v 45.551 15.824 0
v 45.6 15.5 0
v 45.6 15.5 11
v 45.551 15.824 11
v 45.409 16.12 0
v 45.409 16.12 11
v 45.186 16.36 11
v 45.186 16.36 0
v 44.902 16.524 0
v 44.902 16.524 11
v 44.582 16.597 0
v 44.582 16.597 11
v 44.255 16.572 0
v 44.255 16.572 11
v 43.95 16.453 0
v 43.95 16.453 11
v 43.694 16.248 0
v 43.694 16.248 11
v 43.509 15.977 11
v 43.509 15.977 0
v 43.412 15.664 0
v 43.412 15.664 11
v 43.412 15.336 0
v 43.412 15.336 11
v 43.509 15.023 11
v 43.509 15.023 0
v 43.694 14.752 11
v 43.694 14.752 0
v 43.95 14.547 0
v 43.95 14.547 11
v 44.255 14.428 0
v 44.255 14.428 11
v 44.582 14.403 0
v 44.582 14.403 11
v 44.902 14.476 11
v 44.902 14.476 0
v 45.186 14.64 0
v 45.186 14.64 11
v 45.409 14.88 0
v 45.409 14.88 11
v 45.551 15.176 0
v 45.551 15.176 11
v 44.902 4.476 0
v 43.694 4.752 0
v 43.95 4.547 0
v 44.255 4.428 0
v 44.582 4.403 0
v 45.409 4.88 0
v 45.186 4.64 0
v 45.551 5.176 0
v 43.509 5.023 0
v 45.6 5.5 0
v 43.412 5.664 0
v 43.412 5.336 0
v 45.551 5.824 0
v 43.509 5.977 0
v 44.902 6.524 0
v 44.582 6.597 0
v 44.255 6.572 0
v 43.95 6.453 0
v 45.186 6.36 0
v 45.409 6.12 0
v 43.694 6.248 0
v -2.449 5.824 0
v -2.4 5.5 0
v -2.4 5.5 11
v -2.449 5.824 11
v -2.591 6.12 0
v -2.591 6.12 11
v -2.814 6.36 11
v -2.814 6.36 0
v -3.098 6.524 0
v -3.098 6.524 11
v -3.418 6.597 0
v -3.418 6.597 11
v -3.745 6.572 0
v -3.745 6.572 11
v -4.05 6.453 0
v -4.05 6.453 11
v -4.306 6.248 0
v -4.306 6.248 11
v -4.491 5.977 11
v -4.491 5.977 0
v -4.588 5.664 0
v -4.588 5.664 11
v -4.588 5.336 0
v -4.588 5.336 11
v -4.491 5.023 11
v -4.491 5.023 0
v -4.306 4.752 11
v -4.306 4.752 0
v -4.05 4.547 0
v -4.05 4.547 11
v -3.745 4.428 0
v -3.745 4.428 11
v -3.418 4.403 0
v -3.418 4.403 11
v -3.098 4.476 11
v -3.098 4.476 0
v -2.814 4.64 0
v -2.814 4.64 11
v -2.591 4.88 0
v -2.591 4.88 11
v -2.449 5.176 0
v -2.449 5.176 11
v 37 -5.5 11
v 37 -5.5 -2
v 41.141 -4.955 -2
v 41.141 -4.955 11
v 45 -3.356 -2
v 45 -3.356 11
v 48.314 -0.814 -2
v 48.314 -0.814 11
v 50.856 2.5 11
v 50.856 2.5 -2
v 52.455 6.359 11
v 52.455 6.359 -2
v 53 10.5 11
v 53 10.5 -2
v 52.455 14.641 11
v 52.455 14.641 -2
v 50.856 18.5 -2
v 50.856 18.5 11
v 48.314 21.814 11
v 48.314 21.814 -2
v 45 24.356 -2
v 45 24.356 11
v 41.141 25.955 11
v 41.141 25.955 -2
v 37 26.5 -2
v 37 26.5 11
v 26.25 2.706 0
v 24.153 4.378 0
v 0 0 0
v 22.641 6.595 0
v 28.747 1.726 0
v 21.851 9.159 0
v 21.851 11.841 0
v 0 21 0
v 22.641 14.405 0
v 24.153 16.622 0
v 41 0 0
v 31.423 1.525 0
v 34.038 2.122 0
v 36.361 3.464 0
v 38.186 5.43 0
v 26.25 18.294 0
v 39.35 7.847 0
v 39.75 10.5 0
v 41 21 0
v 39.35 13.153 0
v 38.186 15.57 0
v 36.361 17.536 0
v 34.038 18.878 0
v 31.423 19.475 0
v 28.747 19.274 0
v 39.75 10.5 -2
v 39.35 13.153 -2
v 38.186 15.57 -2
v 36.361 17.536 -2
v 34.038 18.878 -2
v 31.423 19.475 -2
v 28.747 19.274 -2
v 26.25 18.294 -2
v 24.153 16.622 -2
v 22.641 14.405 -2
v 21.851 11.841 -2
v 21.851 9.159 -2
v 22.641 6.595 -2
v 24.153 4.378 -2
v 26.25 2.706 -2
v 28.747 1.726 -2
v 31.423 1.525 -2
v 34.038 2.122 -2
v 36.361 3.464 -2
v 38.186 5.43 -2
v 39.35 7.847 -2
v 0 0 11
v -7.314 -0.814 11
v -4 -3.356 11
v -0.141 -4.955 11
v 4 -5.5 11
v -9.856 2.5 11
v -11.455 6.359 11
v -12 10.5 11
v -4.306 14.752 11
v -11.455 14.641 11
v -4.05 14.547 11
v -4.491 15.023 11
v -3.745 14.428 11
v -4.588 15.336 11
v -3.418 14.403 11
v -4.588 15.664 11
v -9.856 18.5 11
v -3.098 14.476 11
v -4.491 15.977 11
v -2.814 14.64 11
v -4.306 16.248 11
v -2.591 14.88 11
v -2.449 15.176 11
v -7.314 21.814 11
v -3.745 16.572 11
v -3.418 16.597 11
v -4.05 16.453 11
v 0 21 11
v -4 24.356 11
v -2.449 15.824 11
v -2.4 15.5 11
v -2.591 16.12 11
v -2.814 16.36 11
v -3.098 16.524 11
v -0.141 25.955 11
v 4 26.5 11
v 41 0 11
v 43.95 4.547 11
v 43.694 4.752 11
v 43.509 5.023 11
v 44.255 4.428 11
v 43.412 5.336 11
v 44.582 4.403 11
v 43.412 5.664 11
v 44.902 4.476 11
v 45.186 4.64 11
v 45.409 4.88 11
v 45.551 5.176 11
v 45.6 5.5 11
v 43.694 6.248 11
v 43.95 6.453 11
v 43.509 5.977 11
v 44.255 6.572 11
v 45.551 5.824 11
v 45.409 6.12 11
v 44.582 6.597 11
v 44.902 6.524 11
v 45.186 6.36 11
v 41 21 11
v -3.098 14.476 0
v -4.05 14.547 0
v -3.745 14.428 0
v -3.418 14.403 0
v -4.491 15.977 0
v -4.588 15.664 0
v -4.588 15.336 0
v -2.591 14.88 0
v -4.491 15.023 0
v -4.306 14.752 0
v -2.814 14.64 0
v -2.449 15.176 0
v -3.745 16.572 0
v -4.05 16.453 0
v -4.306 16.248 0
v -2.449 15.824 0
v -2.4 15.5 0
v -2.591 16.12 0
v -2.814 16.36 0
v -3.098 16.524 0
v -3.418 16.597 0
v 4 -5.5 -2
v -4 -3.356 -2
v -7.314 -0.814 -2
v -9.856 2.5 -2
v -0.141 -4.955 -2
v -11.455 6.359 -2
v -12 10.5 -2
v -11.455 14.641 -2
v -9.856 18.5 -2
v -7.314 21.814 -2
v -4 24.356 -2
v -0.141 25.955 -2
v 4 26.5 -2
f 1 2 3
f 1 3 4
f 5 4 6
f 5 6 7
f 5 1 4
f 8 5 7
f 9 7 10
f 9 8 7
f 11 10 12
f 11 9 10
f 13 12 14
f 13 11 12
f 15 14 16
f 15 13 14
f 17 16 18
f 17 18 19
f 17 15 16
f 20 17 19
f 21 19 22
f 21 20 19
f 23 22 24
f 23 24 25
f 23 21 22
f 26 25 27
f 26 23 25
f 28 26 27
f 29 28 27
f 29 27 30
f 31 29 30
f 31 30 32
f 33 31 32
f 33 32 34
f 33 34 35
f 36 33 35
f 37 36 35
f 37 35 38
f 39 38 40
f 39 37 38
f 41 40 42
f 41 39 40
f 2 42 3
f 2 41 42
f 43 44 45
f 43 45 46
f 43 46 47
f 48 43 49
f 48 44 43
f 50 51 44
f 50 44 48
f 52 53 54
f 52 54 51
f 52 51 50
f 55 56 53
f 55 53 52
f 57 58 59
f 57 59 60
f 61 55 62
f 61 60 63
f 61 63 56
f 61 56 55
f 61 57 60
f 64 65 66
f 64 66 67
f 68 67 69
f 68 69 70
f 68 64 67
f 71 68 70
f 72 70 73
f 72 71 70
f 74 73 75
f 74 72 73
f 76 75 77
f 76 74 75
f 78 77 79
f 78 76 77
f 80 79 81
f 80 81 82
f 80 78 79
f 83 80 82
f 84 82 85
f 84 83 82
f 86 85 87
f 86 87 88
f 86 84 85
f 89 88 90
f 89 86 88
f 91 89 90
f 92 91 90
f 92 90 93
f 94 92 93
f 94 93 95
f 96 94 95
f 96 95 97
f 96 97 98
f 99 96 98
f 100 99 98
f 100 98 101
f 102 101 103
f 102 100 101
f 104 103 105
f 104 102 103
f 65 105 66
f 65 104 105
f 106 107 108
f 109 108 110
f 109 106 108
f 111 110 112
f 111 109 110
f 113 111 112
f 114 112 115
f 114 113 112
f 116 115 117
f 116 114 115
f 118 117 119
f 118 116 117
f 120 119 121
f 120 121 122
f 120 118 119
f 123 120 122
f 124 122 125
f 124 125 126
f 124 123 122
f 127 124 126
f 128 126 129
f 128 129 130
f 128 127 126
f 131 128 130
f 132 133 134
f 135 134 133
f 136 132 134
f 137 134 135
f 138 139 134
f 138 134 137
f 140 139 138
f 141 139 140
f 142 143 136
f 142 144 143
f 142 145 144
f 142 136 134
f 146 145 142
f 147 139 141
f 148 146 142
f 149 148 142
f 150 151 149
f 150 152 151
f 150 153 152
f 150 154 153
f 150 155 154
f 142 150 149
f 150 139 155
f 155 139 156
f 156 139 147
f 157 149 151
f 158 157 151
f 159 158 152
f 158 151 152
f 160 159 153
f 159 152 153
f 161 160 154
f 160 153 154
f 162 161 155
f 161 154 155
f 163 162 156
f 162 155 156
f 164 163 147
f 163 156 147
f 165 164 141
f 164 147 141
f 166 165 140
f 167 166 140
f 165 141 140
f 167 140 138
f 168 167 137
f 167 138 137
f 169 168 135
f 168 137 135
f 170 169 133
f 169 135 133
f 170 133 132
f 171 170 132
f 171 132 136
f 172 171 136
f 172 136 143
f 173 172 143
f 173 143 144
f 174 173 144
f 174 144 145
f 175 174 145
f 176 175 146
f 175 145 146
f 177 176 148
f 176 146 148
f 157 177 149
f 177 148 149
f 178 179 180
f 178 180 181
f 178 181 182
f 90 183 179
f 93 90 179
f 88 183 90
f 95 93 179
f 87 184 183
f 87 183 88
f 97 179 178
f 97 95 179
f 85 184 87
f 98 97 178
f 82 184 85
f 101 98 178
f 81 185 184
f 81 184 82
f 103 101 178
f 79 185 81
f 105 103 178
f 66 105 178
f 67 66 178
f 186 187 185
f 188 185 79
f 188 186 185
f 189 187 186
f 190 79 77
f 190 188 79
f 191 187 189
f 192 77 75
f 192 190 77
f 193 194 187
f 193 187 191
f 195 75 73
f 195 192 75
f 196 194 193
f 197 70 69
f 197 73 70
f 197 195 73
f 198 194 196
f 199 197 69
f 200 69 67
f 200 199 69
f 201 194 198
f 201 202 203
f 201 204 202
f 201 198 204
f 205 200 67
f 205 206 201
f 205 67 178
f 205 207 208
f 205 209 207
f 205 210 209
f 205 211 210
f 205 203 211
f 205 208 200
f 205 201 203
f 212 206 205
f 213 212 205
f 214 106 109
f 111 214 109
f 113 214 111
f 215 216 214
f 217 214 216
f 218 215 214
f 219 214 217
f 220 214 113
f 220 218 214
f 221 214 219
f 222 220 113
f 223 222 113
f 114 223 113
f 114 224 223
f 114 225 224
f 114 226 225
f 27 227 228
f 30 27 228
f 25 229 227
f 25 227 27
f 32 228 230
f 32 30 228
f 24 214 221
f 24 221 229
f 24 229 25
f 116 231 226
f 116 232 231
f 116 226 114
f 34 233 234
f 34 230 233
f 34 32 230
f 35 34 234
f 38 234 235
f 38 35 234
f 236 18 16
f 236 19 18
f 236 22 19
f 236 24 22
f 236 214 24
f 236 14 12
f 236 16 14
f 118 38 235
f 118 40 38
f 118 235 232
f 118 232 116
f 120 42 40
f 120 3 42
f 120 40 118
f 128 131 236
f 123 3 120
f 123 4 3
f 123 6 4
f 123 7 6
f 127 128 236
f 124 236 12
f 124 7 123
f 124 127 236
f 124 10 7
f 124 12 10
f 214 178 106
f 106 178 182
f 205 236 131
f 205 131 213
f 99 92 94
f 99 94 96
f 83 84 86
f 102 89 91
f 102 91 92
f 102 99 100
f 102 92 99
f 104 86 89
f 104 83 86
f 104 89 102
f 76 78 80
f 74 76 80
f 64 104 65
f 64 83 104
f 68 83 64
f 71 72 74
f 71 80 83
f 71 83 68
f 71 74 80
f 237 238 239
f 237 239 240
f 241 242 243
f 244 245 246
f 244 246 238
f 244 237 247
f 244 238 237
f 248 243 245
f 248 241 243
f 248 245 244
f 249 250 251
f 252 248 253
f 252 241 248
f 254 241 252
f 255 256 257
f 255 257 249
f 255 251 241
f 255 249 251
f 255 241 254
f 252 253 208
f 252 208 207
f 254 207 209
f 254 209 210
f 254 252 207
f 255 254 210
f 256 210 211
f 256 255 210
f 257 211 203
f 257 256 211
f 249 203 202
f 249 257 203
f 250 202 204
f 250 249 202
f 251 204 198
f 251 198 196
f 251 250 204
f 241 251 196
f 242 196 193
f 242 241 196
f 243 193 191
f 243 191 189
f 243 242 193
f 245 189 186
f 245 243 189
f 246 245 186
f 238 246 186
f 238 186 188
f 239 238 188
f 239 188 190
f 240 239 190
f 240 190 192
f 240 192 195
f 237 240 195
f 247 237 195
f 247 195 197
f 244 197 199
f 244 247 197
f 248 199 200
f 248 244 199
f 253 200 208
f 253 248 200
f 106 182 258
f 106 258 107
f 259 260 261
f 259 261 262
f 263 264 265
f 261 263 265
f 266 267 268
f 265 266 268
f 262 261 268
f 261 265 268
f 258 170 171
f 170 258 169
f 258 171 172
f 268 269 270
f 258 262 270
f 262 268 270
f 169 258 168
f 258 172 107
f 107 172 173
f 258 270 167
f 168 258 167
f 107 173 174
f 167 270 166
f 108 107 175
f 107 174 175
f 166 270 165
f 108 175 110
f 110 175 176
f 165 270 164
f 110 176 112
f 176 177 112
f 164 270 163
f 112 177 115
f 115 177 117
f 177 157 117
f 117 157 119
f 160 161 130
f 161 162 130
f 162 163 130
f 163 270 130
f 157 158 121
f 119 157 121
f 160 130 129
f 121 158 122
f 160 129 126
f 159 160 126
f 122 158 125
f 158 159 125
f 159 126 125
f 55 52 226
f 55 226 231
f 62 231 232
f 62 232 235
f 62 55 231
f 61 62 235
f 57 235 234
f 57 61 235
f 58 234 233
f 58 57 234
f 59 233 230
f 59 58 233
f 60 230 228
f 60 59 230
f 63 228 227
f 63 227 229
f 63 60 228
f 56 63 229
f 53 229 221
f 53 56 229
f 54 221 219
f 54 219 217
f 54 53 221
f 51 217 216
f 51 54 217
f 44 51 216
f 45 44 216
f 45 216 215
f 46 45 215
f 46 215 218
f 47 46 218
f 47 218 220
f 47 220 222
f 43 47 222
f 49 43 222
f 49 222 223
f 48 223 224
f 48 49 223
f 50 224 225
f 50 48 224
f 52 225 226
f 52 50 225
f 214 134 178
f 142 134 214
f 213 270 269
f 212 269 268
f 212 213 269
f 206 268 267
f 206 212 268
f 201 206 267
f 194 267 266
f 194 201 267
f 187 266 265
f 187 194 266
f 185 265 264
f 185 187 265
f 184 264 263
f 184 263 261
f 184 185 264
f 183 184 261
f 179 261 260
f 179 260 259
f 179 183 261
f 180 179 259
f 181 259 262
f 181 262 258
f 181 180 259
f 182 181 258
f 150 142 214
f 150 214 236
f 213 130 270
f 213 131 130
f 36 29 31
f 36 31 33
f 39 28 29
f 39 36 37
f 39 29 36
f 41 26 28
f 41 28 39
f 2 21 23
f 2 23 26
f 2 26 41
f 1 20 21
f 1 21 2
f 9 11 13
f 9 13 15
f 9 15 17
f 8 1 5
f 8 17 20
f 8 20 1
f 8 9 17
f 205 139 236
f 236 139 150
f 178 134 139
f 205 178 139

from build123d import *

# Parameters (mm, degrees)
SKETCH1_R           = 1.1
SKETCH1_W           = 41
SKETCH1_H           = 21
BOSS_EXTRUDE1_DEPTH = 11
SKETCH2_R           = 9.000000034
BOSS_EXTRUDE2_DEPTH = 2


with BuildPart() as part:
    # Sketch1 → Boss-Extrude1 (new body)
    with BuildSketch(Plane.XY):
        with BuildLine():
            Line((4, -5.500000004), (37, -5.500000004))
            ThreePointArc((37, -5.500000004), (53.000000004, 10.5), (37, 26.500000004))
            Line((37, 26.500000004), (4, 26.500000004))
            ThreePointArc((4, 26.500000004), (-12.000000004, 10.5), (4, -5.500000004))
        make_face()
        with Locations((-3.5, 15.5)):
            Circle(SKETCH1_R, mode=Mode.SUBTRACT)
        with Locations((-3.5, 5.5)):
            Circle(SKETCH1_R, mode=Mode.SUBTRACT)
        with Locations((44.5, 5.5)):
            Circle(SKETCH1_R, mode=Mode.SUBTRACT)
        with Locations((44.5, 15.5)):
            Circle(SKETCH1_R, mode=Mode.SUBTRACT)
        with Locations((20.5, 10.5)):
            Rectangle(SKETCH1_W, SKETCH1_H, mode=Mode.SUBTRACT)
    extrude(amount=BOSS_EXTRUDE1_DEPTH)

    # Sketch2 → Boss-Extrude2 (add)
    with BuildSketch(Plane.XY):
        with BuildLine():
            Line((37, 26.500000004), (4, 26.500000004))
            ThreePointArc((4, 26.500000004), (-12.000000004, 10.5), (4, -5.500000004))
            Line((4, -5.500000004), (37, -5.500000004))
            ThreePointArc((37, -5.500000004), (53.000000004, 10.5), (37, 26.500000004))
        make_face()
        with Locations((30.749999966, 10.5)):
            Circle(SKETCH2_R, mode=Mode.SUBTRACT)
    extrude(amount=-BOSS_EXTRUDE2_DEPTH)


solid = part.part
